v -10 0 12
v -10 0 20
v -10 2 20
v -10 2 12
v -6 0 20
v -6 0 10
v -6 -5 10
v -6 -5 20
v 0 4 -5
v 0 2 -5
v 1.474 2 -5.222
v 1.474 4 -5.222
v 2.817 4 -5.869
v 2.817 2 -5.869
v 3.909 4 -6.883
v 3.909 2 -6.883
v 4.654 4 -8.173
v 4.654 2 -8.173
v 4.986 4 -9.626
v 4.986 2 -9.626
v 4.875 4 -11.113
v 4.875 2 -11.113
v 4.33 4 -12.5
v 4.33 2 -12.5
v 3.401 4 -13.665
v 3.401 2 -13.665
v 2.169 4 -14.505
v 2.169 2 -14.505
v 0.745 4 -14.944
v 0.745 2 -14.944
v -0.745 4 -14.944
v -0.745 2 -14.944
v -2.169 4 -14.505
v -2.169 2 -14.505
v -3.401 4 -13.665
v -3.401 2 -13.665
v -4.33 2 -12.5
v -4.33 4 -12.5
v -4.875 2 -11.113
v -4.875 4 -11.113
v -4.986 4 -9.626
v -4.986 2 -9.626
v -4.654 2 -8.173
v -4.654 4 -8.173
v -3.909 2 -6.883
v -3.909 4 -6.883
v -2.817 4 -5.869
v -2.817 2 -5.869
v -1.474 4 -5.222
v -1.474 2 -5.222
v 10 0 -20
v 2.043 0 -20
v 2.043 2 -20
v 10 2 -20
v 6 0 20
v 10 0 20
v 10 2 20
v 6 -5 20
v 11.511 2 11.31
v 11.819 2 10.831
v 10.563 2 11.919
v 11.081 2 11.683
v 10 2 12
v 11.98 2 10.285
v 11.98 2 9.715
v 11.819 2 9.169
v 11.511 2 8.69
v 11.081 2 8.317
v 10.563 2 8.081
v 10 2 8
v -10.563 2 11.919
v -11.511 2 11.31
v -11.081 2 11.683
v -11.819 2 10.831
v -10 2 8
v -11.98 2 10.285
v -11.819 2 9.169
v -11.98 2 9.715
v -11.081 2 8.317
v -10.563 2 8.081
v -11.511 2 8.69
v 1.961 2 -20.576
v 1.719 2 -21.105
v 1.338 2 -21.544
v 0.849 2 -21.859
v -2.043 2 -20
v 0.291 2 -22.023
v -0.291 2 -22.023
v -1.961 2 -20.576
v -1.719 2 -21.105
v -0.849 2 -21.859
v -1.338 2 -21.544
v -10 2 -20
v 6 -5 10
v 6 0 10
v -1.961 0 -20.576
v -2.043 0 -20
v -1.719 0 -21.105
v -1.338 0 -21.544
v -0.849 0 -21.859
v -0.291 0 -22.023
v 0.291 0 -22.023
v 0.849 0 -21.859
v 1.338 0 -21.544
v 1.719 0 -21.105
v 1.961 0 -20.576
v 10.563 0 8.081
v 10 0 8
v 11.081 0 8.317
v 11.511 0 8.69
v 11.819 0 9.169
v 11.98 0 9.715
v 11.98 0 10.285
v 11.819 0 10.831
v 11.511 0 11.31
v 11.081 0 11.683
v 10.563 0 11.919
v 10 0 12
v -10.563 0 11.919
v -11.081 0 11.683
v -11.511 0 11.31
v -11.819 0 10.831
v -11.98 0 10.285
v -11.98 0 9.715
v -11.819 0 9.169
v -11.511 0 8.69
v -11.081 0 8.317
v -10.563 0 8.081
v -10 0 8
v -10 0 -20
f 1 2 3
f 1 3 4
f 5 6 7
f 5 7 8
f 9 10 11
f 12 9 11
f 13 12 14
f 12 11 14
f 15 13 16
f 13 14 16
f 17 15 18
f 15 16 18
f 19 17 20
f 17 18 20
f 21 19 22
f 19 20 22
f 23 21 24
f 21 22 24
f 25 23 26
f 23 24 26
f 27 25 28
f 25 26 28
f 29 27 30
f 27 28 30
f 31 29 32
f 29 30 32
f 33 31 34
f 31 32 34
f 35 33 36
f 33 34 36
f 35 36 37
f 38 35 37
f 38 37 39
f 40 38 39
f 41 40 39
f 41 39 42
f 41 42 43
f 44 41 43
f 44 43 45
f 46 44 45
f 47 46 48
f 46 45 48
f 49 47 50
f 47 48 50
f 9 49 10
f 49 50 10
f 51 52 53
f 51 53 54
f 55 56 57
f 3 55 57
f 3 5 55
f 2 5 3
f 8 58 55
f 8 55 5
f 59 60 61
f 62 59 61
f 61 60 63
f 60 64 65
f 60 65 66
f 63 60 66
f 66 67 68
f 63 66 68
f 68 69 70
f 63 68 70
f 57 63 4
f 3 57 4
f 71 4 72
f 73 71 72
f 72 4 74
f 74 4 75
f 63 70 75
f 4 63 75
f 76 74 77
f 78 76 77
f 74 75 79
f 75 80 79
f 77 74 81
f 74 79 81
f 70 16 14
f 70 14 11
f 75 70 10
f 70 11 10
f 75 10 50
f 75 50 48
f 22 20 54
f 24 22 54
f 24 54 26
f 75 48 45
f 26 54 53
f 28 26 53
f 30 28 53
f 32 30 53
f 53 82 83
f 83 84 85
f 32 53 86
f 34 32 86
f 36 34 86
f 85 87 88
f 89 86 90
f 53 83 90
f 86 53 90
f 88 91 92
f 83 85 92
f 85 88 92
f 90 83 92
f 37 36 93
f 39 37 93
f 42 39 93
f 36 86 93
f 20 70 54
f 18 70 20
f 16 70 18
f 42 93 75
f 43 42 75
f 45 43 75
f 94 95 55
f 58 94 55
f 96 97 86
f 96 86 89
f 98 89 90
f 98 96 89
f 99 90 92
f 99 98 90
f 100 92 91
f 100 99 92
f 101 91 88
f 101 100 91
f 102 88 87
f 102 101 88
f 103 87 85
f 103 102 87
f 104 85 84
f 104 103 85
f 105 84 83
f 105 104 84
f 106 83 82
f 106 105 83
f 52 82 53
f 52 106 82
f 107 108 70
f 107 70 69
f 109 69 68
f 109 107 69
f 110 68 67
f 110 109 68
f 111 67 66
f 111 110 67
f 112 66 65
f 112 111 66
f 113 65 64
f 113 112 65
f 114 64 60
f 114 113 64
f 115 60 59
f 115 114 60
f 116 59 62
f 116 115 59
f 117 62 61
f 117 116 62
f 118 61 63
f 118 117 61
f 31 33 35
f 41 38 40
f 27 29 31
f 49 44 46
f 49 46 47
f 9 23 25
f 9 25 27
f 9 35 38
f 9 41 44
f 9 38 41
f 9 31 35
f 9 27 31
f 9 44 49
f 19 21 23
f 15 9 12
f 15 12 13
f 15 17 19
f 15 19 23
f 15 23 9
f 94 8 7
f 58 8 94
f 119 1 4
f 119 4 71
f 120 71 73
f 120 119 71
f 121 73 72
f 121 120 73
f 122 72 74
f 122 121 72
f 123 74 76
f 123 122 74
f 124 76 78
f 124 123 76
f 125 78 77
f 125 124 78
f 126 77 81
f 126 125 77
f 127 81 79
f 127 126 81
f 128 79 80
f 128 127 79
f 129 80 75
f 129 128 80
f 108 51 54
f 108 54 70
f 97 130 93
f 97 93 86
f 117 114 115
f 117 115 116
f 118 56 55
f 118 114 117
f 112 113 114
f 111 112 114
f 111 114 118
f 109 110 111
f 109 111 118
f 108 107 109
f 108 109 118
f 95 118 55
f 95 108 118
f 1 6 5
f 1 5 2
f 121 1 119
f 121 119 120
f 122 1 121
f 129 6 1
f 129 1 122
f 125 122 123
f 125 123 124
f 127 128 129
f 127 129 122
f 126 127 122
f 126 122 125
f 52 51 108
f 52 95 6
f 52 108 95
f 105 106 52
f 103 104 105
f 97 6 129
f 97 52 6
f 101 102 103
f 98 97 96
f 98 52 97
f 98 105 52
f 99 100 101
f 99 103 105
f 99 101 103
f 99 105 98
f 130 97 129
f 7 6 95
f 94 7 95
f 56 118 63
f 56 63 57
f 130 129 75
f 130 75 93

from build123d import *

# Parameters (mm, degrees)
BOSS_EXTRUDE1_DEPTH = 2
SKETCH3_R           = 5
BOSS_EXTRUDE2_DEPTH = 2
SKETCH5_W           = 12
SKETCH5_H           = 10
BOSS_EXTRUDE3_DEPTH = 5


with BuildPart() as part:
    # Sketch2 → Boss-Extrude1 (new body)
    with BuildSketch(Plane(origin=(0, 0, 0), x_dir=(1, 0, 0), z_dir=(0, 1, 0))):
        with BuildLine():
            Line((2.043336986, 20), (10, 20))
            Line((10, 20), (10, -8))
            ThreePointArc((10, -8), (12, -10), (10, -12))
            Line((10, -12), (10, -20))
            Line((10, -20), (-10, -20))
            Line((-10, -20), (-10, -12))
            ThreePointArc((-10, -12), (-12, -10), (-10, -8))
            Line((-10, -8), (-10, 20))
            Line((-10, 20), (-2.043336986, 20))
            ThreePointArc((-2.043336986, 20), (0, 22.043336986), (2.043336986, 20))
        make_face()
    extrude(amount=BOSS_EXTRUDE1_DEPTH)

    # Sketch3 → Boss-Extrude2 (add)
    with BuildSketch(Plane(origin=(0, 2, 0), x_dir=(1, 0, 0), z_dir=(0, 1, 0))):
        with Locations(Location((0, 10, 0), (0, 0, 270))):
            Circle(SKETCH3_R)
    extrude(amount=BOSS_EXTRUDE2_DEPTH)

    # Sketch5 → Boss-Extrude3 (add)
    with BuildSketch(Plane.XZ):
        with Locations((0, 15)):
            Rectangle(SKETCH5_W, SKETCH5_H)
    extrude(amount=BOSS_EXTRUDE3_DEPTH)


solid = part.part
